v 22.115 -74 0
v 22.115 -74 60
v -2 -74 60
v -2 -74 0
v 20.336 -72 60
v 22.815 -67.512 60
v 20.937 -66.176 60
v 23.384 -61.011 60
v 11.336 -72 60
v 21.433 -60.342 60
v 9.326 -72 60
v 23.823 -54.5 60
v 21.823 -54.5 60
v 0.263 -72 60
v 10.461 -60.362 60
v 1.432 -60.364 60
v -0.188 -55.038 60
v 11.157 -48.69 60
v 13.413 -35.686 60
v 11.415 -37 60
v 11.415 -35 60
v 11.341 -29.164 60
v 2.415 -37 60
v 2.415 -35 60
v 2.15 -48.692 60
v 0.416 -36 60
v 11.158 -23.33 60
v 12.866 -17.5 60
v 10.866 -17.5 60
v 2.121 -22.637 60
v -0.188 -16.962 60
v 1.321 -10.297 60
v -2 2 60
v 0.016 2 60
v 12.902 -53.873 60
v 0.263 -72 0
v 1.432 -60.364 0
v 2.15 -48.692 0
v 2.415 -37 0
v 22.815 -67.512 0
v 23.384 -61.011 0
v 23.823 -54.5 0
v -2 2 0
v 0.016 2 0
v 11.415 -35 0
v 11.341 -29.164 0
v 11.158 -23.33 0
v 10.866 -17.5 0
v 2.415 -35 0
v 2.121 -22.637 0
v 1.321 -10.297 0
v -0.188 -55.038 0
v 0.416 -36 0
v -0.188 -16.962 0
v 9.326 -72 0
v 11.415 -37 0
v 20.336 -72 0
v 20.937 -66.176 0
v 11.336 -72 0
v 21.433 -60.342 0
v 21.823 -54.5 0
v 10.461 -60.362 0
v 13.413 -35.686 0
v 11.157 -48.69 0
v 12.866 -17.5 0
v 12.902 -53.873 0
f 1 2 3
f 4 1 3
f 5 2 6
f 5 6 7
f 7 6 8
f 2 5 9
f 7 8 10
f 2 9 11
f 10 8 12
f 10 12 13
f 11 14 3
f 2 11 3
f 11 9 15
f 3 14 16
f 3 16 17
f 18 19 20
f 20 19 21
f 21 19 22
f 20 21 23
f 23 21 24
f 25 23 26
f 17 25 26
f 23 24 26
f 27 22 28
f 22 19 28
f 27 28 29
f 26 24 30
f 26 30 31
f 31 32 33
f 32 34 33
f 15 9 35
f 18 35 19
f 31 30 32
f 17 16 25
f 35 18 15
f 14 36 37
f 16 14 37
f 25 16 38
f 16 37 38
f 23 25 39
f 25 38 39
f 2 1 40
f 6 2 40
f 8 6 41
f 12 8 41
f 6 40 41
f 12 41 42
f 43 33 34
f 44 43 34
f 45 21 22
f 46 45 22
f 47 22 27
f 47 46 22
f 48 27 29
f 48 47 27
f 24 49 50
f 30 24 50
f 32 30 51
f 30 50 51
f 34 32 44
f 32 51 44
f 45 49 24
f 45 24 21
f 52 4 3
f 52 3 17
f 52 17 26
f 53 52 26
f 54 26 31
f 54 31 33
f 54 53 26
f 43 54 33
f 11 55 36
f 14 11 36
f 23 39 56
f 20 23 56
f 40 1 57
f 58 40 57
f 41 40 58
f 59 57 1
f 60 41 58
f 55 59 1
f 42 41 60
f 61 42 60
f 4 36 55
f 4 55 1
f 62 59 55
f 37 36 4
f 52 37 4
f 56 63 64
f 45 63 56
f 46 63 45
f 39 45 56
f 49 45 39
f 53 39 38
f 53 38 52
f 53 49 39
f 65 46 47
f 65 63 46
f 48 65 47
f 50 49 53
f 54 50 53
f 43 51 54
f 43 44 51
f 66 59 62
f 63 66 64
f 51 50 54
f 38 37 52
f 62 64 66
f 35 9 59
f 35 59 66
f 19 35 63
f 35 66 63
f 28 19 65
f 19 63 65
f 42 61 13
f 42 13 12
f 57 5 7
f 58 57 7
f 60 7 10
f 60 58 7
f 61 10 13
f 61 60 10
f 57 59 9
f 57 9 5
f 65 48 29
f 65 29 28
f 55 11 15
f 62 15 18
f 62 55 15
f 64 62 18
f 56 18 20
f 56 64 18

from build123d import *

# Parameters (mm, degrees)
PAD_DEPTH = 60


with BuildPart() as part:
    # Sketch → Pad (new body)
    with BuildSketch(Plane.XY):
        with BuildLine():
            Line((2.414743, -35), (11.414743, -35))
            ThreePointArc((11.414743, -35), (11.263358, -26.246135), (10.865622, -17.5))
            Line((10.865622, -17.5), (12.865622, -17.5))
            ThreePointArc((11.335628, -72), (13.289566, -44.783378), (12.865622, -17.5))
            Line((11.335628, -72), (20.335628, -72))
            ThreePointArc((20.335628, -72), (21.198564, -63.260143), (21.822782, -54.5))
            Line((21.822782, -54.5), (23.822782, -54.5))
            ThreePointArc((22.11492, -74), (23.116177, -64.262903), (23.822782, -54.5))
            Line((22.11492, -74), (-2, -74))
            ThreePointArc((-2, -74), (0.416398, -36), (-2, 2))
            Line((-2, 2), (0.016131, 2))
            ThreePointArc((2.414743, -35), (1.783801, -16.463154), (0.016131, 2))
        make_face()
        with BuildLine():
            Line((2.414743, -37), (11.414743, -37))
            ThreePointArc((9.325722, -72), (10.863864, -54.529463), (11.414743, -37))
            Line((9.325722, -72), (0.263026, -72))
            ThreePointArc((0.263026, -72), (1.847307, -54.531257), (2.414743, -37))
        make_face(mode=Mode.SUBTRACT)
    extrude(amount=PAD_DEPTH)


solid = part.part
